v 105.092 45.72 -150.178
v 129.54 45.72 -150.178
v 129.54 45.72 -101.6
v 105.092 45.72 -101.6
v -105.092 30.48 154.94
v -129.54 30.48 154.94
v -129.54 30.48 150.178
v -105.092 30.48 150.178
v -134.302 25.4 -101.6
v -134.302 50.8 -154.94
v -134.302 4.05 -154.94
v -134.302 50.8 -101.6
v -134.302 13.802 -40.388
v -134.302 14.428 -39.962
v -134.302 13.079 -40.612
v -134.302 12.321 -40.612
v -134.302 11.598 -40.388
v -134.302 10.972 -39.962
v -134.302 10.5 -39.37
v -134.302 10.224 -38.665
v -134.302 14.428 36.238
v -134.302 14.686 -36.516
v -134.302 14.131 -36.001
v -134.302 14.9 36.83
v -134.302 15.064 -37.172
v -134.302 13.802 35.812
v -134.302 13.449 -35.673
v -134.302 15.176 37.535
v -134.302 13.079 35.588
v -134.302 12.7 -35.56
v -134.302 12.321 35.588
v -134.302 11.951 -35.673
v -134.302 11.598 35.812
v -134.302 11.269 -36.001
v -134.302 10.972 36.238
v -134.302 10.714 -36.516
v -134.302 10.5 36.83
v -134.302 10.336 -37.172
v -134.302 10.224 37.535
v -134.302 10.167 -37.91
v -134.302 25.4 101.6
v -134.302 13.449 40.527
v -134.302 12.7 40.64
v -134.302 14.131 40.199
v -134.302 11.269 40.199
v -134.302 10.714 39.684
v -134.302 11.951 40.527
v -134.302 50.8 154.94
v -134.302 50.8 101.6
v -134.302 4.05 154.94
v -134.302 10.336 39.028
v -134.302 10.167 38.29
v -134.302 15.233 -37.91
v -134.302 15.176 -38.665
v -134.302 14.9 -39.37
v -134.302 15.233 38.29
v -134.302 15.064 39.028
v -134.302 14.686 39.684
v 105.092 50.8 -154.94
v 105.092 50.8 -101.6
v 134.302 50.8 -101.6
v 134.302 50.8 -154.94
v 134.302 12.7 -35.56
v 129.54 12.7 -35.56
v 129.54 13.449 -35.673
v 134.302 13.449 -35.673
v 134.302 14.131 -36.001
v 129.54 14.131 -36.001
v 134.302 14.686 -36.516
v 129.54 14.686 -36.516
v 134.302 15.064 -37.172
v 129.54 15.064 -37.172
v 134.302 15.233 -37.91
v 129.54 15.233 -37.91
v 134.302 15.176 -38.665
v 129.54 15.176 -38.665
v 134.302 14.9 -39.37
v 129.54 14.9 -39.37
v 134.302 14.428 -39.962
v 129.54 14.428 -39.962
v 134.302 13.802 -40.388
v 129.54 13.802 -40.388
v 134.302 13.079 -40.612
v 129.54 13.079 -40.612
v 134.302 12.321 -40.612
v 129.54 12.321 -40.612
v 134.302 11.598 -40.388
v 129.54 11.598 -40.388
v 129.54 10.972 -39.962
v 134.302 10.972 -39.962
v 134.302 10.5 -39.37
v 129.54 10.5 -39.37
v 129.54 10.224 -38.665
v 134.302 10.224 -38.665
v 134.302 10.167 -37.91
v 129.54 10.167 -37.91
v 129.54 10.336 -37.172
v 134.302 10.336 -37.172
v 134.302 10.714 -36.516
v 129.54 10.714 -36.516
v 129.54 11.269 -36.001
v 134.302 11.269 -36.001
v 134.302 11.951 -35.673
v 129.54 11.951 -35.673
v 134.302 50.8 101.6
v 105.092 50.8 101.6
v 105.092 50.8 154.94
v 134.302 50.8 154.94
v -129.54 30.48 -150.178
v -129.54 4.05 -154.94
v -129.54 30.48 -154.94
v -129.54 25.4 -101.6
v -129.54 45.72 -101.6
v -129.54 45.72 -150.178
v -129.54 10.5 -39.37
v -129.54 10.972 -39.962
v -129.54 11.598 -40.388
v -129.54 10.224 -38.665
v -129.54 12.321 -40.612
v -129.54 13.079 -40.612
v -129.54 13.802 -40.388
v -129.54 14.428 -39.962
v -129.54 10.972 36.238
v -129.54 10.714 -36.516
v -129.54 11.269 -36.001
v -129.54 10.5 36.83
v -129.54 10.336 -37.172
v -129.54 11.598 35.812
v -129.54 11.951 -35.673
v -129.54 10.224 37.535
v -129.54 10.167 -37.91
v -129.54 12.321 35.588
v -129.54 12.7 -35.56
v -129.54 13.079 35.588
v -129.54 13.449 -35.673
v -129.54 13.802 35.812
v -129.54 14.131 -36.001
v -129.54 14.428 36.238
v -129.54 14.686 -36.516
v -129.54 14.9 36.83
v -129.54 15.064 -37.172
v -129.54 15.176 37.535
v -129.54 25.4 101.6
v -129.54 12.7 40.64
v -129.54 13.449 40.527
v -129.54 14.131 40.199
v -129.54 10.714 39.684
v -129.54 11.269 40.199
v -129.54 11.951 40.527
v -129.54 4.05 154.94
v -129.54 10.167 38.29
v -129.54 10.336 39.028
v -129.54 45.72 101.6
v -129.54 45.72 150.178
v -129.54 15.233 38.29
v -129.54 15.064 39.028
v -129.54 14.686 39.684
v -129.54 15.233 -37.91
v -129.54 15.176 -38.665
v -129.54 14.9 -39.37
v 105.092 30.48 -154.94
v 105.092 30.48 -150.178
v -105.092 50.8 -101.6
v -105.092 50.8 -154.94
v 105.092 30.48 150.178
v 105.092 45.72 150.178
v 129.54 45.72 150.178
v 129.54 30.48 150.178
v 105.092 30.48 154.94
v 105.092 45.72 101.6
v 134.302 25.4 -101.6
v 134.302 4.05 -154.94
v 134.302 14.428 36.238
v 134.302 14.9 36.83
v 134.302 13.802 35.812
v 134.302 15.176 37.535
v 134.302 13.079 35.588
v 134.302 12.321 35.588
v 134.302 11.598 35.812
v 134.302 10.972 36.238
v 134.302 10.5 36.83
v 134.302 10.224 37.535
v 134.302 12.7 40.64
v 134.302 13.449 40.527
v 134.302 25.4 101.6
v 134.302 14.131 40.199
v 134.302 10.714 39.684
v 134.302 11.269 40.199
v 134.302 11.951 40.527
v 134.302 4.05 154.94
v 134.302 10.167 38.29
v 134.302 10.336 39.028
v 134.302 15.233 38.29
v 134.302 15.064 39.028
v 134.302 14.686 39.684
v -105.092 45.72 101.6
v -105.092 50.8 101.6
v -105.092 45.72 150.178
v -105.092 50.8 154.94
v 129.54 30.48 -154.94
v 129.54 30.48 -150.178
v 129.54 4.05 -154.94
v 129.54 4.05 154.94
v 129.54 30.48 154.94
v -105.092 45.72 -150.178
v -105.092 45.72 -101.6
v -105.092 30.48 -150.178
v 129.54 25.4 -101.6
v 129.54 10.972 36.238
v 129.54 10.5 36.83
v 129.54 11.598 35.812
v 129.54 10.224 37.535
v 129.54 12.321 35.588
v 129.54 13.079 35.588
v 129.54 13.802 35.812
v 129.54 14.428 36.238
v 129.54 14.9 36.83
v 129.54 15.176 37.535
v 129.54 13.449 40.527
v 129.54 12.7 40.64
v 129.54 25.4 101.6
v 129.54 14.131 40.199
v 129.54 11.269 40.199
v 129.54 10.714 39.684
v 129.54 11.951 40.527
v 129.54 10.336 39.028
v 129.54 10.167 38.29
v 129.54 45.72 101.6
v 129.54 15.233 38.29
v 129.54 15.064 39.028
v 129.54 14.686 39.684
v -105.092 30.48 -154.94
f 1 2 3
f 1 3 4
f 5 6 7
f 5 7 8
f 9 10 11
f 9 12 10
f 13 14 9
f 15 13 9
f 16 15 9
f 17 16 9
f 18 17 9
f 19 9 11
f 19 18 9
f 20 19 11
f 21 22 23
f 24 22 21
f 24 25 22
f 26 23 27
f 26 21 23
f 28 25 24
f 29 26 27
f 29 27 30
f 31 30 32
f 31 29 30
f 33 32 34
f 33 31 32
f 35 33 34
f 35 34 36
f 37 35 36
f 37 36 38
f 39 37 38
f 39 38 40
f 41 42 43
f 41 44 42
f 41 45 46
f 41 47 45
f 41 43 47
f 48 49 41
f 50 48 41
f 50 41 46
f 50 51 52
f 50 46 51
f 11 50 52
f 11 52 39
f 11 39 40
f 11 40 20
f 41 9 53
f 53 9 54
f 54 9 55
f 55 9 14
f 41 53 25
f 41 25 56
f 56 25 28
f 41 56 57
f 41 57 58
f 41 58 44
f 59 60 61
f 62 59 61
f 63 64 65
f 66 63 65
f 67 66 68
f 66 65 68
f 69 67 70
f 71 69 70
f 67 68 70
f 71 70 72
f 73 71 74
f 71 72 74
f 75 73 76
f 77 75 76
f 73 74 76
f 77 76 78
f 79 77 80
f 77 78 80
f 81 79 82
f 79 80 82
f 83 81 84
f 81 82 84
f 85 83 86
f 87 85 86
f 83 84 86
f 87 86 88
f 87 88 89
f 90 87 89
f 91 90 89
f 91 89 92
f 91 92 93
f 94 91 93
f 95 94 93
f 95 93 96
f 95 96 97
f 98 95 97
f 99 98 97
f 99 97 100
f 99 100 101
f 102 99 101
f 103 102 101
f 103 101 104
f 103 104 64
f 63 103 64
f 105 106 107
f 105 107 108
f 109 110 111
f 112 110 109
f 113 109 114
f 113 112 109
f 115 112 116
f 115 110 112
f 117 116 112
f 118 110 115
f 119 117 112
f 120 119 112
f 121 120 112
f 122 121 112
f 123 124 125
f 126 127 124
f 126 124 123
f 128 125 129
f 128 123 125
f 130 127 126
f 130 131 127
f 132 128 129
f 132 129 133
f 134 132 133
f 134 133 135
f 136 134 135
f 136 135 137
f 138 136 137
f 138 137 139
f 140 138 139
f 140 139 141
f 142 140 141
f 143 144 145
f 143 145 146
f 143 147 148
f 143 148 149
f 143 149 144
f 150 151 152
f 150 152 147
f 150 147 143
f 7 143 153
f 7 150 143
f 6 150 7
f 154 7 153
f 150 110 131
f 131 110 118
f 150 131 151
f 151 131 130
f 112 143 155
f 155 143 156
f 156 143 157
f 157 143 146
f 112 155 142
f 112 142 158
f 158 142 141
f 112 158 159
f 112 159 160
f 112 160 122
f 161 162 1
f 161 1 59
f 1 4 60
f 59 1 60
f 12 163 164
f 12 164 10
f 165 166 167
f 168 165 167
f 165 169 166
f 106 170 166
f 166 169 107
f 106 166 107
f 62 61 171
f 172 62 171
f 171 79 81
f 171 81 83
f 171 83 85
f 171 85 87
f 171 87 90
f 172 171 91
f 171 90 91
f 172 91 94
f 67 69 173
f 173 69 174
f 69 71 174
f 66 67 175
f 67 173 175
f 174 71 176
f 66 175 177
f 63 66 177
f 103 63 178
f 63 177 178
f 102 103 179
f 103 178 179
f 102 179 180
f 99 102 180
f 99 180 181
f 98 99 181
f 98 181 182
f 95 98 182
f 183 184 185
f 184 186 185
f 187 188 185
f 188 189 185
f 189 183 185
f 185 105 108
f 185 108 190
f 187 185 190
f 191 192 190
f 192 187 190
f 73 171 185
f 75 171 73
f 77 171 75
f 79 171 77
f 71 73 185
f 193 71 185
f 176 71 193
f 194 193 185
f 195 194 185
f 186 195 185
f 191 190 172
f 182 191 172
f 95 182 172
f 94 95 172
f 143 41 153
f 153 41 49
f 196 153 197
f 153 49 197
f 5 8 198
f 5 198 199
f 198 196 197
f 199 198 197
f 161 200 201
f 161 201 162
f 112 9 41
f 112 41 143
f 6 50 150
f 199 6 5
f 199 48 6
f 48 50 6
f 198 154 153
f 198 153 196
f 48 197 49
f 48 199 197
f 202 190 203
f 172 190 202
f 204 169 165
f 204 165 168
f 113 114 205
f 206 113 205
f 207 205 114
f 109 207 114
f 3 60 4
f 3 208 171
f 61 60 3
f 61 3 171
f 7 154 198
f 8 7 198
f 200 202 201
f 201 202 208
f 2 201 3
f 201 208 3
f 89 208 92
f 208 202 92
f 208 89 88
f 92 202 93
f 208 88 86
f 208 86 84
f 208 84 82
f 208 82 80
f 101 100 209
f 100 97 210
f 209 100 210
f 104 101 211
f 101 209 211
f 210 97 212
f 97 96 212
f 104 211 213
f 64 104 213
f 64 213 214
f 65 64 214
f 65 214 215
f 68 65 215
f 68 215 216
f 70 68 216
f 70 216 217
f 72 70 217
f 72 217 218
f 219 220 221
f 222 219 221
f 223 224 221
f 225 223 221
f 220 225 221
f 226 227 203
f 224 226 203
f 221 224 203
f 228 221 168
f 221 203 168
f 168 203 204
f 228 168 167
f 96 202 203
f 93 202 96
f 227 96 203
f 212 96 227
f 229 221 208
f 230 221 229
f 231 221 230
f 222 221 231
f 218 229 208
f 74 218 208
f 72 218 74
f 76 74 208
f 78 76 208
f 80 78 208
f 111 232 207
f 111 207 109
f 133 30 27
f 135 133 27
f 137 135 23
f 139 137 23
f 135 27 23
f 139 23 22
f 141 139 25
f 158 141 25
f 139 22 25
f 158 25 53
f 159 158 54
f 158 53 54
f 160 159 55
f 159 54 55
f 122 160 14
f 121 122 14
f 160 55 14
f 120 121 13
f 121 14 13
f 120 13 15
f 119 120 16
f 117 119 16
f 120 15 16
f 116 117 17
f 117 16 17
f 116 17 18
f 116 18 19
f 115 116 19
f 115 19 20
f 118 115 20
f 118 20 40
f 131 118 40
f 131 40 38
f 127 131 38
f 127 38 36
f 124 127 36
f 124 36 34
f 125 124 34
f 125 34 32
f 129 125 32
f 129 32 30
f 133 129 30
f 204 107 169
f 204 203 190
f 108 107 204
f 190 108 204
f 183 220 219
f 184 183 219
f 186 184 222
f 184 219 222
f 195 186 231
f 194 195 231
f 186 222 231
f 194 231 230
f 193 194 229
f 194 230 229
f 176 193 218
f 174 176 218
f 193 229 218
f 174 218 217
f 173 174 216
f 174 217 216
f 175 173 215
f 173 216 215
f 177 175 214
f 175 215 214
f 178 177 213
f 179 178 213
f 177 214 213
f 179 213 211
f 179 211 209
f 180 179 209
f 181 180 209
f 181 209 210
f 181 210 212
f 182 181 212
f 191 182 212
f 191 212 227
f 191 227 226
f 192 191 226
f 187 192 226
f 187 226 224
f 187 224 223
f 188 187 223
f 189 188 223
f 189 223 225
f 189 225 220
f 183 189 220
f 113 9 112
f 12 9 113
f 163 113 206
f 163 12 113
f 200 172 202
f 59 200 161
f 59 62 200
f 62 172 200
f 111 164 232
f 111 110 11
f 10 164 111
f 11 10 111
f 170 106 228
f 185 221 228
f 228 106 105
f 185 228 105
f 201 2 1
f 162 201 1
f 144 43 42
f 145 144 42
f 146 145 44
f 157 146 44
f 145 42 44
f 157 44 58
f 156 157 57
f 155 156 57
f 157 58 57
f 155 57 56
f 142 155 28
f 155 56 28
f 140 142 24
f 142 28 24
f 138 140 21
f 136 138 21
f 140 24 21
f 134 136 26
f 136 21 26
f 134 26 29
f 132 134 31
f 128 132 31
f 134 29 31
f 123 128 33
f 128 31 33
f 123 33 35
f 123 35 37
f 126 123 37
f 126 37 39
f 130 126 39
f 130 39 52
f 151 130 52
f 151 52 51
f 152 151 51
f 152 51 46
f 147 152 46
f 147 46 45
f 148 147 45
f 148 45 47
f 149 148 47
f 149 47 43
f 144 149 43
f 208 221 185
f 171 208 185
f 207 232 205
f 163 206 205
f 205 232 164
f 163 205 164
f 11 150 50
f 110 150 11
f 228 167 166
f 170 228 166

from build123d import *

# Parameters (mm, degrees)
BOSS_EXTRUDE1_DEPTH        = 154.94
BOSS_EXTRUDE1_DEPTH_BACK   = 154.94
BOSS_EXTRUDE1_2_DEPTH      = 154.94
BOSS_EXTRUDE1_2_DEPTH_BACK = 154.94
SKETCH3_W                  = 29.21
SKETCH3_H                  = 20.32
BOSS_EXTRUDE2_DEPTH        = 4.7625
SKETCH4_W                  = 29.21
SKETCH4_H                  = 20.32
BOSS_EXTRUDE3_DEPTH        = 4.7625
SKETCH5_W                  = 29.21
SKETCH5_H                  = 25.4
CUT_EXTRUDE1_DEPTH         = 101.6
CUT_EXTRUDE1_DEPTH_BACK    = 101.6
SKETCH6_R                  = 2.54
CUT_EXTRUDE3_DEPTH         = 269.605
SKETCH7_W                  = 309.88
SKETCH7_H                  = 4.050329793
CUT_EXTRUDE4_DEPTH         = 269.605


with BuildPart() as part:
    # Sketch2 → Boss-Extrude1 (new body, two sides)
    with BuildSketch(Plane.XY) as boss_extrude1_sk:
        Polygon((-129.54, 0), (-129.54, 45.72), (-105.0925, 45.72), (-105.0925, 50.8), (-134.3025, 50.8), (-134.3025, 0), align=None)
    extrude(amount=BOSS_EXTRUDE1_DEPTH)
    extrude(boss_extrude1_sk.sketch, amount=-BOSS_EXTRUDE1_DEPTH_BACK)



with BuildPart() as body_2:
    # Sketch2 → Boss-Extrude1 2 (new body, two sides)
    with BuildSketch(Plane.XY) as boss_extrude1_2_sk:
        Polygon((105.0925, 45.72), (105.0925, 50.8), (134.3025, 50.8), (134.3025, 0), (129.54, 0), (129.54, 45.72), align=None)
    extrude(amount=BOSS_EXTRUDE1_2_DEPTH)
    extrude(boss_extrude1_2_sk.sketch, amount=-BOSS_EXTRUDE1_2_DEPTH_BACK)


with BuildPart() as part_1:
    add(part.part)

    add(body_2.part)  # Boss-Extrude2 merges body 2
    # Sketch3 → Boss-Extrude2 (add)
    with BuildSketch(Plane.XY.offset(154.94)):
        with Locations((-119.6975, 40.64)):
            Rectangle(SKETCH3_W, SKETCH3_H)
        with Locations((119.6975, 40.64)):
            Rectangle(SKETCH3_W, SKETCH3_H)
    extrude(amount=-BOSS_EXTRUDE2_DEPTH)

    # Sketch4 → Boss-Extrude3 (add)
    with BuildSketch(Plane(origin=(0, 0, -154.94), x_dir=(-1, 0, 0), z_dir=(0, 0, -1))):
        with Locations((119.6975, 40.64)):
            Rectangle(SKETCH4_W, SKETCH4_H)
        with Locations((-119.6975, 40.64)):
            Rectangle(SKETCH4_W, SKETCH4_H)
    extrude(amount=-BOSS_EXTRUDE3_DEPTH)

    # Sketch5 → Cut-Extrude1 (cut, two sides)
    with BuildSketch(Plane.XY) as cut_extrude1_sk:
        with Locations((119.6975, 38.1)):
            Rectangle(SKETCH5_W, SKETCH5_H)
        with Locations((-119.6975, 38.1)):
            Rectangle(SKETCH5_W, SKETCH5_H)
    extrude(amount=CUT_EXTRUDE1_DEPTH, mode=Mode.SUBTRACT)
    extrude(cut_extrude1_sk.sketch, amount=-CUT_EXTRUDE1_DEPTH_BACK, mode=Mode.SUBTRACT)

    # Sketch6 → Cut-Extrude3 (cut, through all)
    with BuildSketch(Plane.ZY.offset(134.3025)):
        with Locations((38.1, 12.7)):
            Circle(SKETCH6_R)
        with Locations((-38.1, 12.7)):
            Circle(SKETCH6_R)
    extrude(amount=-CUT_EXTRUDE3_DEPTH, mode=Mode.SUBTRACT)

    # Sketch7 → Cut-Extrude4 (cut, through all)
    with BuildSketch(Plane(origin=(134.3025, 0, 0), x_dir=(0, 0, -1), z_dir=(1, 0, 0))):
        with Locations((0, 2.025164897)):
            Rectangle(SKETCH7_W, SKETCH7_H)
    extrude(amount=-CUT_EXTRUDE4_DEPTH, mode=Mode.SUBTRACT)


solid = part_1.part
